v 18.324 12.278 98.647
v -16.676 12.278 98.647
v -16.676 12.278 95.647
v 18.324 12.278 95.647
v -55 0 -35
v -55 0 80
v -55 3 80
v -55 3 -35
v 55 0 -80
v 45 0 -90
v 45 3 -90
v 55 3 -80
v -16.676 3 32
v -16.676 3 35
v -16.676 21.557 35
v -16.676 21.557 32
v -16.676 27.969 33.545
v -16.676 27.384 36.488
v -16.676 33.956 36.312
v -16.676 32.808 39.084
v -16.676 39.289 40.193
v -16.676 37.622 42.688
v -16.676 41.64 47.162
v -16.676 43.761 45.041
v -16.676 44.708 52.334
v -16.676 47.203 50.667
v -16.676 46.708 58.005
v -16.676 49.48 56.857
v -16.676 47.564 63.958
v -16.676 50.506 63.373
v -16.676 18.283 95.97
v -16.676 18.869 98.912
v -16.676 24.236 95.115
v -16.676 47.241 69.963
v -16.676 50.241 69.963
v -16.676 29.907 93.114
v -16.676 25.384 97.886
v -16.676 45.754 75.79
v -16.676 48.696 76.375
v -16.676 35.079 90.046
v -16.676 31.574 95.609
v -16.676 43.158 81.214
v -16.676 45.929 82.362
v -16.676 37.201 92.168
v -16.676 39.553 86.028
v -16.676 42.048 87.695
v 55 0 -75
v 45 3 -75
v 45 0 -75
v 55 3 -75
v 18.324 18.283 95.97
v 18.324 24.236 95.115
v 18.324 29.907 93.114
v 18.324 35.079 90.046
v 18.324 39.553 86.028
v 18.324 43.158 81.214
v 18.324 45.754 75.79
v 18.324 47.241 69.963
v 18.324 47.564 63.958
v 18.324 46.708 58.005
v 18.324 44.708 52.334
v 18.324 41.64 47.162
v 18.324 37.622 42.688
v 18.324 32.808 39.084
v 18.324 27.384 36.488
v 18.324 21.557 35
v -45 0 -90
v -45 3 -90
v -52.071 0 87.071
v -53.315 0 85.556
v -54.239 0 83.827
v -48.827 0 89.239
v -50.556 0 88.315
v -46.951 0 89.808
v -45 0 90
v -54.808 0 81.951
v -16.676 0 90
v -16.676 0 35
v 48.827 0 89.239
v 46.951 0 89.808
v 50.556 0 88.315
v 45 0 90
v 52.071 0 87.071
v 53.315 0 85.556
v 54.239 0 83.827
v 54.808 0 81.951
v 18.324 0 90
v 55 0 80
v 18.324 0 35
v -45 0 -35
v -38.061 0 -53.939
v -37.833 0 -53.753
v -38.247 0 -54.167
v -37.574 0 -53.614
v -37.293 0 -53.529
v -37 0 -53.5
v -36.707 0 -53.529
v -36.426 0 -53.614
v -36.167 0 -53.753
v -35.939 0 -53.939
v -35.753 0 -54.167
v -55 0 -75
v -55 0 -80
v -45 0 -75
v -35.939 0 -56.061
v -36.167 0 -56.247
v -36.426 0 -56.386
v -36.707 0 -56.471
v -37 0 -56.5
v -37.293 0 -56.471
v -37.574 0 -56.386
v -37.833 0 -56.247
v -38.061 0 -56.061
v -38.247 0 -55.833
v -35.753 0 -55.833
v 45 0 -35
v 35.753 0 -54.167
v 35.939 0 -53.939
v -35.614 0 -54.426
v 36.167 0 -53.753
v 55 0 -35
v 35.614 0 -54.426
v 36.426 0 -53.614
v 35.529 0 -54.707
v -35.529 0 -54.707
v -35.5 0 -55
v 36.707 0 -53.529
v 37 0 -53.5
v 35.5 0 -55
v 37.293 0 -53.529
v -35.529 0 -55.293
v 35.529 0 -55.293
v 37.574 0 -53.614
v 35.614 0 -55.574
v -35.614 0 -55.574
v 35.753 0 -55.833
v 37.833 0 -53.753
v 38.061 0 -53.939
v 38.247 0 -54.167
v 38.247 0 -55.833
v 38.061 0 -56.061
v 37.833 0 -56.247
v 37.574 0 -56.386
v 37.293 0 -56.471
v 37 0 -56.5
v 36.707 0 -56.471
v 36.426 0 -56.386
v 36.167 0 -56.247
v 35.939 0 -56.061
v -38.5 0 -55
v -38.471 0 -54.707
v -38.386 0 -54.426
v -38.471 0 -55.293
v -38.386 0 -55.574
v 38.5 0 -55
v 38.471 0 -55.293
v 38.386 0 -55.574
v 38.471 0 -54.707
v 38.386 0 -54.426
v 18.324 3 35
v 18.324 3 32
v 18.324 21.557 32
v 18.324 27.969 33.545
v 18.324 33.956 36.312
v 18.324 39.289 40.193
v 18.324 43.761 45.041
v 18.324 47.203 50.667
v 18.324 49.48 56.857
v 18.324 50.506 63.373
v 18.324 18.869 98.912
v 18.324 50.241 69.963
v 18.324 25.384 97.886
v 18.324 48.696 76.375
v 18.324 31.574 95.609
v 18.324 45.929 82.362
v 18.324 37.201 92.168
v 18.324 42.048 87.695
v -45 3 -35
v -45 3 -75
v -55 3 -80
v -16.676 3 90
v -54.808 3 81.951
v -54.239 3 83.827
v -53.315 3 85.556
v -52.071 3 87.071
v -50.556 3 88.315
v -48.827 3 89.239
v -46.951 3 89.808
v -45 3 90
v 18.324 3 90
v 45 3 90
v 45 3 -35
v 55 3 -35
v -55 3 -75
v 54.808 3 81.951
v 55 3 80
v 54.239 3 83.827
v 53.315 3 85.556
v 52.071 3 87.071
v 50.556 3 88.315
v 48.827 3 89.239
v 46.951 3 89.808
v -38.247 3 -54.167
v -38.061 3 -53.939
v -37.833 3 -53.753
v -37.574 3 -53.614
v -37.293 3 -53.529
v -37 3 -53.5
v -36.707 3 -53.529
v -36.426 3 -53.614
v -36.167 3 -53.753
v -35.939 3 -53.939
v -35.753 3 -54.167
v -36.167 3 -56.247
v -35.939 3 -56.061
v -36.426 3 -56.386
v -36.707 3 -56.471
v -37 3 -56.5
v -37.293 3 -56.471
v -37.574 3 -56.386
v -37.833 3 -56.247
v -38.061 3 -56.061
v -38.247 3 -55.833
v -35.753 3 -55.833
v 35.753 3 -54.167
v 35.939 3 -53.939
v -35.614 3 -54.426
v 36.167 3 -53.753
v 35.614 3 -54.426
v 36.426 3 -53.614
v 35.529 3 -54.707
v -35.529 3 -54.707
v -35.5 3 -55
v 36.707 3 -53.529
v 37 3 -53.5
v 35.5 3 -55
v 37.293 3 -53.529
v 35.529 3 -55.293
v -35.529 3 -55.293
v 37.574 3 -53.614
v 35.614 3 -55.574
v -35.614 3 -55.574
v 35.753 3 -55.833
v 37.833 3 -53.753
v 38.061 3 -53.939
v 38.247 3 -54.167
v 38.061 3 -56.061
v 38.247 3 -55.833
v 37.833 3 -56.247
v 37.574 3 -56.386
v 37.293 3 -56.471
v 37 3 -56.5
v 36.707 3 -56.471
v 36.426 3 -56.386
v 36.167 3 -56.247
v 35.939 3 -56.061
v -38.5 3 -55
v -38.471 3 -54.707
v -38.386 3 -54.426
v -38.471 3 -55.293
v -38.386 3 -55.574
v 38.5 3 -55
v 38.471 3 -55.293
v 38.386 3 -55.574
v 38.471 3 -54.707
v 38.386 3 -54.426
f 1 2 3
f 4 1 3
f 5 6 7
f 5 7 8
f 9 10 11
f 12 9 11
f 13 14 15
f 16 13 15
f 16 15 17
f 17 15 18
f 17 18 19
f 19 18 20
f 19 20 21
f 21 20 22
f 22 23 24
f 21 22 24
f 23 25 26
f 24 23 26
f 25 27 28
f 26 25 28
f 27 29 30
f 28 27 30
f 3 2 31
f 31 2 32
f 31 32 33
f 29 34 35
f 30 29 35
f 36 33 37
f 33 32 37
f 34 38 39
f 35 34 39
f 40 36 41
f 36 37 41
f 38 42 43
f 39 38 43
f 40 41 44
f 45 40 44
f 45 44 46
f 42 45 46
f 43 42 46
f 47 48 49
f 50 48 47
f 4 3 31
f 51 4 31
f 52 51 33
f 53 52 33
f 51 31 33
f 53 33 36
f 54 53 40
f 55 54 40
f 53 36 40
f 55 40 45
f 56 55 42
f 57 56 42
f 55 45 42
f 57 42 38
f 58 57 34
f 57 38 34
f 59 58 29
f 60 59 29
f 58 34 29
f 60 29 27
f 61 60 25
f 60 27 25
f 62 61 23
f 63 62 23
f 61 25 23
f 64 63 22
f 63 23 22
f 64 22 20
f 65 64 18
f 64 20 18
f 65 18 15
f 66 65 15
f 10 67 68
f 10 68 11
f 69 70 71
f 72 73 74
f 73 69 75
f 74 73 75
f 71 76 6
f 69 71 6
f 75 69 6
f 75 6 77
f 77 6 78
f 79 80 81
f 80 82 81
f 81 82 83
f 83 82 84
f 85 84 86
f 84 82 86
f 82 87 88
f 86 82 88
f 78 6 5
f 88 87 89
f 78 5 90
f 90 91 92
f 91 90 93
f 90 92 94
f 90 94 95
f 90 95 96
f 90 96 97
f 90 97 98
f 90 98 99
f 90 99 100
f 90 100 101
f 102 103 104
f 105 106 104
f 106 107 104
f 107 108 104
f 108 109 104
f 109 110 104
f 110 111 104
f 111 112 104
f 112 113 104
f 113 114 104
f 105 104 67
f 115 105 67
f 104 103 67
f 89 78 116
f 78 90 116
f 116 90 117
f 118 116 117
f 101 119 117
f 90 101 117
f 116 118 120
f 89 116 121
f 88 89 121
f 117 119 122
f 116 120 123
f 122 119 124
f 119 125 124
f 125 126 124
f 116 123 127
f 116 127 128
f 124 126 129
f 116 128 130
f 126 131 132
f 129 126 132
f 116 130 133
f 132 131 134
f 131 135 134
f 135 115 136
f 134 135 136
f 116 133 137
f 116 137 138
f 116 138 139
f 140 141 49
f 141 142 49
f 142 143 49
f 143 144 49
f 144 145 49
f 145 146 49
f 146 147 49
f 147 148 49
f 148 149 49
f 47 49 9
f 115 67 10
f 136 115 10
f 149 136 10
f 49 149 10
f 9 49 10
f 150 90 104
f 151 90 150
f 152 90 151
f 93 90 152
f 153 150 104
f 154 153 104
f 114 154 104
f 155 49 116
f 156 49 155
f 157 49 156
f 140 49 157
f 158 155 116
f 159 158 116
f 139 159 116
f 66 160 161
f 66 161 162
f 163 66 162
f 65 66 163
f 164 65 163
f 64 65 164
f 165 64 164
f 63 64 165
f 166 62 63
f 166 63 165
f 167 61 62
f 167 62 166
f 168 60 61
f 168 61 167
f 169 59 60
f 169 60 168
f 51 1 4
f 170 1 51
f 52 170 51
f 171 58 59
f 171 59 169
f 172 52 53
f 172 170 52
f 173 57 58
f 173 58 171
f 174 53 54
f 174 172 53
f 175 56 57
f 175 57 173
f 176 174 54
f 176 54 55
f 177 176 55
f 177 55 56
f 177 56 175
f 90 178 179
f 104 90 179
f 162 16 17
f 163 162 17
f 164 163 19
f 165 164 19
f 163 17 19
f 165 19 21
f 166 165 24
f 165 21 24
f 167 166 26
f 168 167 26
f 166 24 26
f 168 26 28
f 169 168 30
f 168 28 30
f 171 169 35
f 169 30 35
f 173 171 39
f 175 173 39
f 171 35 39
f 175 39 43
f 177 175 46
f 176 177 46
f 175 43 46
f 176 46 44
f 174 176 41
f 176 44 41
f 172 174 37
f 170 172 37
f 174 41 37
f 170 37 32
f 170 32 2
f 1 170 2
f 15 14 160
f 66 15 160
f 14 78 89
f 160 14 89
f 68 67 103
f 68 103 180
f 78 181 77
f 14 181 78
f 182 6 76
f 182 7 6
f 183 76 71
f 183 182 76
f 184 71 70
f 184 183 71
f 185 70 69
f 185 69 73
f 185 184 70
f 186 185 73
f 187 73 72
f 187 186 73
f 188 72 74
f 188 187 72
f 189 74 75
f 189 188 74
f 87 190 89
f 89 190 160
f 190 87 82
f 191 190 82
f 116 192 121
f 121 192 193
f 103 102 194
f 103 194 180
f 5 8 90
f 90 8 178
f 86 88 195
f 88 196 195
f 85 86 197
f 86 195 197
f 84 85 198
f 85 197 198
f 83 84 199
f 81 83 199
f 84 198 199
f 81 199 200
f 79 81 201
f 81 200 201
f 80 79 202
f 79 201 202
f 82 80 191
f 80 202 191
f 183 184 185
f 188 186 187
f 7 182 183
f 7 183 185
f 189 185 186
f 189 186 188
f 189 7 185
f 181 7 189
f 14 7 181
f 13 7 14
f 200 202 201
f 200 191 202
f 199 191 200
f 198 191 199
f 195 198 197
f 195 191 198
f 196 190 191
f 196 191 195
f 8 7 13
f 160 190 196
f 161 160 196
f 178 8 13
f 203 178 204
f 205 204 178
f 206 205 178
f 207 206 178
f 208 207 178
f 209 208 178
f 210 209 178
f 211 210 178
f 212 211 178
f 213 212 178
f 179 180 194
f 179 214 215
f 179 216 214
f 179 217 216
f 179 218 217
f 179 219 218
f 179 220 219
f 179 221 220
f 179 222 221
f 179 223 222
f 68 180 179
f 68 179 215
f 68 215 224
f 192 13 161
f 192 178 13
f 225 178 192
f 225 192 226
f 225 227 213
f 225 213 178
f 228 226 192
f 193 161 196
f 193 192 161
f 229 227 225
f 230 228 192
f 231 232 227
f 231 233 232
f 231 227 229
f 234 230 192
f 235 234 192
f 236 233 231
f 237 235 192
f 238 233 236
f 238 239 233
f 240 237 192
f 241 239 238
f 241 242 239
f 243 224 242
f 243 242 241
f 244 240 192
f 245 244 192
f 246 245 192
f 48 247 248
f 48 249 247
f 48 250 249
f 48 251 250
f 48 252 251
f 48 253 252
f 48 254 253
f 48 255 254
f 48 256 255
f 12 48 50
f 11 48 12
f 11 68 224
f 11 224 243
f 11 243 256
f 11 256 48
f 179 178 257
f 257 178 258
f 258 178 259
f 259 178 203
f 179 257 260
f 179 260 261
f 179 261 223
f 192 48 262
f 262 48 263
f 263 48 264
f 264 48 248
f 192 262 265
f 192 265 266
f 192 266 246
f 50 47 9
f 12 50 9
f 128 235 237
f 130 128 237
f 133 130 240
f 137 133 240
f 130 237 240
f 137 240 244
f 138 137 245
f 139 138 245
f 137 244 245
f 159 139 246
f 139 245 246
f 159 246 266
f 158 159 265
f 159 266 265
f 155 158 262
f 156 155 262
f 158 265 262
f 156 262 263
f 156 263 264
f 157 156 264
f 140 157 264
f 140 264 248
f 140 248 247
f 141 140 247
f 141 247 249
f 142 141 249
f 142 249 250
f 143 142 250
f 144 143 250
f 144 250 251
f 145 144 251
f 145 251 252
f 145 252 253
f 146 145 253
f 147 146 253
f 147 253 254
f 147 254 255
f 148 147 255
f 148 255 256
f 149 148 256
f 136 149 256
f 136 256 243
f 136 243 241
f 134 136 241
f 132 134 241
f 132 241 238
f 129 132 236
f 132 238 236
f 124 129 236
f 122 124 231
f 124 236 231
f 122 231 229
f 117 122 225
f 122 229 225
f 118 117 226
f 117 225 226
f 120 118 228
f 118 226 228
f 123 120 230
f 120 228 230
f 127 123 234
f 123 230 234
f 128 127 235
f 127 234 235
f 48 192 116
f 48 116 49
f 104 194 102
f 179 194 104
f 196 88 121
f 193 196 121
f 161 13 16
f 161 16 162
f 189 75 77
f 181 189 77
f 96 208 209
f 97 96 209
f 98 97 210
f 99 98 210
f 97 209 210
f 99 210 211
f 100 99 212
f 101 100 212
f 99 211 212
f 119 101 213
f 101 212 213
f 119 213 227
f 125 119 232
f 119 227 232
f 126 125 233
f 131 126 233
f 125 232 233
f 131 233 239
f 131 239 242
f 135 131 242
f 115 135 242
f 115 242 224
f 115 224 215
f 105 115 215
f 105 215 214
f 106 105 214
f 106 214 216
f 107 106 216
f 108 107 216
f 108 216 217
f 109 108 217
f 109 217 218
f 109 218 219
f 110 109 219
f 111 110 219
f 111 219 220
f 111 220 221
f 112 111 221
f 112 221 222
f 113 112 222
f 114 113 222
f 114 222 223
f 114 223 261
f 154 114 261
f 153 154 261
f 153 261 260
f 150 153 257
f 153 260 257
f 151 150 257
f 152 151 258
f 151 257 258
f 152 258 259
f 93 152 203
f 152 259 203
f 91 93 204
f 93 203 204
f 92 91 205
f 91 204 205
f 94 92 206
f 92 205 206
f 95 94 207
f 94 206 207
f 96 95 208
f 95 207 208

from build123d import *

# Parameters (mm, degrees)
SKETCH3_W           = 110
SKETCH3_H           = 180
BOSS_EXTRUDE1_DEPTH = 3
CUT_EXTRUDE1_REACH  = 107.518
SKETCH4_W           = 35
SKETCH4_H           = 55
CUT_EXTRUDE2_REACH  = 107.518
SKETCH5_R           = 1.5
FILLET1_R           = 10
FILLET2_R           = 10
SKETCH9_W           = 35
SKETCH9_H           = 3
BOSS_EXTRUDE2_DEPTH = 18.556788
BOSS_EXTRUDE3_START = -16.676438017
BOSS_EXTRUDE3_DEPTH = 35
CUT_EXTRUDE3_REACH  = 124.809
SKETCH16_W          = 10
SKETCH16_H          = 40
CHAMFER1_SIZE       = 10


# Read off the part's stored shape, not the designer's step: Boss-Extrude3
with BuildPart() as part:
    # Sketch3 → Boss-Extrude1 (new body)
    with BuildSketch(Plane(origin=(0, 0, 0), x_dir=(1, 0, 0), z_dir=(0, 1, 0))):
        Rectangle(SKETCH3_W, SKETCH3_H)
    extrude(amount=BOSS_EXTRUDE1_DEPTH)

    # Sketch4 → Cut-Extrude1 (cut, up to next)
    with BuildSketch(Plane(origin=(0, 3, 0), x_dir=(1, 0, 0), z_dir=(0, 1, 0)), mode=Mode.PRIVATE) as cut_extrude1_sk1:
        with Locations((0.823561983, -62.5)):
            Rectangle(SKETCH4_W, SKETCH4_H)
    cut_extrude1_tool1 = extrude(cut_extrude1_sk1.sketch, amount=-CUT_EXTRUDE1_REACH, mode=Mode.PRIVATE) & part.part
    add(cut_extrude1_tool1.solids().sort_by_distance((0.823562, 3, 62.5))[0], mode=Mode.SUBTRACT)

    # Sketch5 → Cut-Extrude2 (cut, up to next)
    with BuildSketch(Plane(origin=(0, 3, 0), x_dir=(1, 0, 0), z_dir=(0, 1, 0)), mode=Mode.PRIVATE) as cut_extrude2_sk1:
        with Locations(Location((37, 55, 0), (0, 0, 270))):
            Circle(SKETCH5_R)
    cut_extrude2_tool1 = extrude(cut_extrude2_sk1.sketch, amount=-CUT_EXTRUDE2_REACH, mode=Mode.PRIVATE) & part.part
    # Sketch5 → Cut-Extrude2 (cut, up to next)
    with BuildSketch(Plane(origin=(0, 3, 0), x_dir=(1, 0, 0), z_dir=(0, 1, 0)), mode=Mode.PRIVATE) as cut_extrude2_sk2:
        with Locations(Location((-37, 55, 0), (0, 0, 270))):
            Circle(SKETCH5_R)
    cut_extrude2_tool2 = extrude(cut_extrude2_sk2.sketch, amount=-CUT_EXTRUDE2_REACH, mode=Mode.PRIVATE) & part.part
    add(cut_extrude2_tool1.solids().sort_by_distance((37, 3, -55))[0], mode=Mode.SUBTRACT)
    add(cut_extrude2_tool2.solids().sort_by_distance((-37, 3, -55))[0], mode=Mode.SUBTRACT)

    # Fillet1
    fillet1_edges = [part.edges().sort_by_distance(p)[0] for p in [
        (-55, 1.5, 90),
    ]]
    fillet(fillet1_edges, radius=FILLET1_R)

    # Fillet2
    fillet2_edges = [part.edges().sort_by_distance(p)[0] for p in [
        (55, 1.5, 90),
    ]]
    fillet(fillet2_edges, radius=FILLET2_R)

    # Sketch9 → Boss-Extrude2 (add)
    with BuildSketch(Plane(origin=(0, 3, 0), x_dir=(1, 0, 0), z_dir=(0, 1, 0))):
        with Locations((0.823561983, -33.5)):
            Rectangle(SKETCH9_W, SKETCH9_H)
    extrude(amount=BOSS_EXTRUDE2_DEPTH)

    # Boss-Extrude3 outline → Boss-Extrude3 (add)
    with BuildSketch(Plane.YZ.offset(BOSS_EXTRUDE3_START)):
        with BuildLine():
            ThreePointArc((21.556787547, 32), (50.241297741, 69.962903968), (12.278393773, 98.647414162))
            Line((12.278393773, 98.647414162), (12.278393773, 95.647414162))
            ThreePointArc((12.278393773, 95.647414162), (47.241297741, 69.962903968), (21.556787547, 35))
            Line((21.556787547, 35), (21.556787547, 32))
        make_face()
    extrude(amount=BOSS_EXTRUDE3_DEPTH)

    # Sketch16 → Cut-Extrude3 (cut, up to next)
    with BuildSketch(Plane(origin=(0, 3, 0), x_dir=(1, 0, 0), z_dir=(0, 1, 0)), mode=Mode.PRIVATE) as cut_extrude3_sk1:
        with Locations((50, 55)):
            Rectangle(SKETCH16_W, SKETCH16_H)
    cut_extrude3_tool1 = extrude(cut_extrude3_sk1.sketch, amount=-CUT_EXTRUDE3_REACH, mode=Mode.PRIVATE) & part.part
    # Sketch16 → Cut-Extrude3 (cut, up to next)
    with BuildSketch(Plane(origin=(0, 3, 0), x_dir=(1, 0, 0), z_dir=(0, 1, 0)), mode=Mode.PRIVATE) as cut_extrude3_sk2:
        with Locations((-50, 55)):
            Rectangle(SKETCH16_W, SKETCH16_H)
    cut_extrude3_tool2 = extrude(cut_extrude3_sk2.sketch, amount=-CUT_EXTRUDE3_REACH, mode=Mode.PRIVATE) & part.part
    add(cut_extrude3_tool1.solids().sort_by_distance((50, 3, -55))[0], mode=Mode.SUBTRACT)
    add(cut_extrude3_tool2.solids().sort_by_distance((-50, 3, -55))[0], mode=Mode.SUBTRACT)

    # Chamfer1
    chamfer1_edges = [part.edges().sort_by_distance(p)[0] for p in [
        (-55, 1.5, -90),
        (55, 1.5, -90),
    ]]
    chamfer(chamfer1_edges, length=CHAMFER1_SIZE)


solid = part.part
